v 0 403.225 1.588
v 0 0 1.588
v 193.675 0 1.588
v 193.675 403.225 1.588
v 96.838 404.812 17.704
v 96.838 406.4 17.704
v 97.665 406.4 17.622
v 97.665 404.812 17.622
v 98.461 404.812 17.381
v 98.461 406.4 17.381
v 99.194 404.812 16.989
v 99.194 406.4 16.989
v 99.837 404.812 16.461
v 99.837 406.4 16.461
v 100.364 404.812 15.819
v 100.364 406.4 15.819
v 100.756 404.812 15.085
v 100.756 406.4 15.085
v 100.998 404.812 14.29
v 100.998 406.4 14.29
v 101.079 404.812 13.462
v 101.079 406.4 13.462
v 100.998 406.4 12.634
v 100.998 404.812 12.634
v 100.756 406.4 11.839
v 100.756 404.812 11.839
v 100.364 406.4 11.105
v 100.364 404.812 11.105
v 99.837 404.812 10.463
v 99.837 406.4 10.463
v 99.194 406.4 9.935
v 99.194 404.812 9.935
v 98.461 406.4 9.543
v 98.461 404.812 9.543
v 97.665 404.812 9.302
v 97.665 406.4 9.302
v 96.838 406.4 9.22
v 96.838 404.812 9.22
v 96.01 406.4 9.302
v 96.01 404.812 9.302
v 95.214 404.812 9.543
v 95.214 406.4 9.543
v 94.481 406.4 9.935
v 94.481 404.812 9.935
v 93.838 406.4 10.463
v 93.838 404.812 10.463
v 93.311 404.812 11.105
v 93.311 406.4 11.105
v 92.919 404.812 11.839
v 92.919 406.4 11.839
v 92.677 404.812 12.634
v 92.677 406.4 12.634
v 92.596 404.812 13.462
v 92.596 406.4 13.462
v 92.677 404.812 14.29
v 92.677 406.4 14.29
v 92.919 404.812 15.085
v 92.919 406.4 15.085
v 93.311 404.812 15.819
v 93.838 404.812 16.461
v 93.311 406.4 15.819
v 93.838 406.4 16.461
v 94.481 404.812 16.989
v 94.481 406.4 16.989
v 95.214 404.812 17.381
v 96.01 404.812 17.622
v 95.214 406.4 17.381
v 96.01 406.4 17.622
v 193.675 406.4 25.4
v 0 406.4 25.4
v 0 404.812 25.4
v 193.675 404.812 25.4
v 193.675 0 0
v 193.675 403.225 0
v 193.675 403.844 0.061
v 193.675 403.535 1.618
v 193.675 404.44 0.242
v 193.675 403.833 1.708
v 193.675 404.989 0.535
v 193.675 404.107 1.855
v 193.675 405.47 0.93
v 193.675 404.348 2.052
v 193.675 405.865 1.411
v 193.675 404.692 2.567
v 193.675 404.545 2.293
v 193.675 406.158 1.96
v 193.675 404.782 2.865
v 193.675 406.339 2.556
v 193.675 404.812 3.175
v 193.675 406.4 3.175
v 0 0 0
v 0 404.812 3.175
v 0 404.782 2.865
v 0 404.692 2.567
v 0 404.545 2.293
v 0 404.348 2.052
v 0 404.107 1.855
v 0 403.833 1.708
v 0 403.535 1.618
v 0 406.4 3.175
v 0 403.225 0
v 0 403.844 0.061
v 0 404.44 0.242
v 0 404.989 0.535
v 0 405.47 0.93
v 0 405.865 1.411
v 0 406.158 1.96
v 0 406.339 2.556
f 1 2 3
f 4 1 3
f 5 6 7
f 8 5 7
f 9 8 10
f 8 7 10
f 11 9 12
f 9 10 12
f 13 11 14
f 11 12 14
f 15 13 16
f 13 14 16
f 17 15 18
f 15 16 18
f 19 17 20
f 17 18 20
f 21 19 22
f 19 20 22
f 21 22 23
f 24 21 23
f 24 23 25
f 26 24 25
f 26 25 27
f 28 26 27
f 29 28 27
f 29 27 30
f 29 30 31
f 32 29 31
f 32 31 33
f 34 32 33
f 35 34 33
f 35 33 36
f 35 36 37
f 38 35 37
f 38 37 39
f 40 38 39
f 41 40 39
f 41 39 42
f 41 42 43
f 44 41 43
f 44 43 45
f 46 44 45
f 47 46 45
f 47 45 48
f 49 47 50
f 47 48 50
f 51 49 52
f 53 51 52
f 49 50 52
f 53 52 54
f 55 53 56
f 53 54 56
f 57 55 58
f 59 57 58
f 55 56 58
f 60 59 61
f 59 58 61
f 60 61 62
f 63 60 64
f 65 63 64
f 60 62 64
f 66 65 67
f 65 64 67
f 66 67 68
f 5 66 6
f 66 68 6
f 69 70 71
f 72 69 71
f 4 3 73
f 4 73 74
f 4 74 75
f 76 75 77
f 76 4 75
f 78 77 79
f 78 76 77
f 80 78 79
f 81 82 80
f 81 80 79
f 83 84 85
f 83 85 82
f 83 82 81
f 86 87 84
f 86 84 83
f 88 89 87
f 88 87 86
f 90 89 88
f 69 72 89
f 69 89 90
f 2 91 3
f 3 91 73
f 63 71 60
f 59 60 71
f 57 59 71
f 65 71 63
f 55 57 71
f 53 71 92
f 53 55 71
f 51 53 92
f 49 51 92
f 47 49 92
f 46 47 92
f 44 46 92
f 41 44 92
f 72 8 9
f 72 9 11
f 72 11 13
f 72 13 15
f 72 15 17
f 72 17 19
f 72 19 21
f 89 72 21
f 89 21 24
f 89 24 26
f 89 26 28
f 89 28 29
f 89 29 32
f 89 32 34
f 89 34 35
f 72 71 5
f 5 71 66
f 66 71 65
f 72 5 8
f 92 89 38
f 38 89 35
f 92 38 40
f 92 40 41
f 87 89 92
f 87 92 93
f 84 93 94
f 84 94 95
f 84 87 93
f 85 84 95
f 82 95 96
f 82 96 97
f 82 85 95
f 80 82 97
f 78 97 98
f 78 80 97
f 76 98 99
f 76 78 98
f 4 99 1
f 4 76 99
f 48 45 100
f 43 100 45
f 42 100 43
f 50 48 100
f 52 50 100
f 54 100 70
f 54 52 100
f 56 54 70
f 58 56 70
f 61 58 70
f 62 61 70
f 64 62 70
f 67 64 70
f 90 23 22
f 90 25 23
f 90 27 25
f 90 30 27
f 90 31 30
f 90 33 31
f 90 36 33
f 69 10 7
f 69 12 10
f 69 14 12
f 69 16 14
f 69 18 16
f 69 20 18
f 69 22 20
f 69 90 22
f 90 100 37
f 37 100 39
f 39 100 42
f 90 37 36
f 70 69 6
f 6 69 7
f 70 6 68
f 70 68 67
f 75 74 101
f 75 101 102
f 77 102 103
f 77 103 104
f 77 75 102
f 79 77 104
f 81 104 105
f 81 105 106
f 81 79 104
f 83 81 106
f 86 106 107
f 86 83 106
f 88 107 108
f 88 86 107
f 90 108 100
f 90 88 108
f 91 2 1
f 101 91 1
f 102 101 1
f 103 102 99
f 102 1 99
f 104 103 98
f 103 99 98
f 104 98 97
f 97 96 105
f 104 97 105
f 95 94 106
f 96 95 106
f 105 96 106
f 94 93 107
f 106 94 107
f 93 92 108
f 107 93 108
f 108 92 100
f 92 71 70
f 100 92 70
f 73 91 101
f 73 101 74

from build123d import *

# Parameters (mm, degrees)
SKETCH1_W                    = 193.675
SKETCH1_H                    = 406.4
BOSS_EXTRUDE1_DEPTH          = 1.5875
EDGE_FLANGE1_STRIP_W         = 9.525
EDGE_FLANGE1_STRIP_H         = 1.5875
EDGE_FLANGE1_STRIP_CUT_DEPTH = 193.675
EDGE_FLANGE1_DEPTH           = 193.675
SKETCH5_R                    = 4.2418
CUT_EXTRUDE1_DEPTH           = 2.54


# Sheet-metal steps are written as plain solids
with BuildPart() as part:
    # Sketch1 → Boss-Extrude1 (new body)
    with BuildSketch(Plane.XY):
        with Locations((96.8375, 203.2)):
            Rectangle(SKETCH1_W, SKETCH1_H)
    extrude(amount=BOSS_EXTRUDE1_DEPTH)

    # Edge-Flange1 strip (across the edge) → Edge-Flange1 strip cut (cut)
    with BuildSketch(Plane(origin=(193.675, 406.4, 1.5875), x_dir=(0, -1, 0), z_dir=(-1, 0, 0))):
        with Locations((-1.5875, -0.79375)):
            Rectangle(EDGE_FLANGE1_STRIP_W, EDGE_FLANGE1_STRIP_H)
    extrude(amount=EDGE_FLANGE1_STRIP_CUT_DEPTH, mode=Mode.SUBTRACT)

    # Edge-Flange1 section (across the edge) → Edge-Flange1 (add)
    with BuildSketch(Plane(origin=(193.675, 406.4, 1.5875), x_dir=(0, -1, 0), z_dir=(-1, 0, 0))):
        with BuildLine():
            Line((0, 1.5875), (0, 23.8125))
            Line((0, 23.8125), (1.5875, 23.8125))
            Line((1.5875, 23.8125), (1.5875, 1.5875))
            ThreePointArc((1.5875, 1.5875), (2.052467985, 0.464967985), (3.175, 0))
            Line((3.175, 0), (3.175, -1.5875))
            ThreePointArc((3.175, -1.5875), (0.92993597, -0.65756403), (0, 1.5875))
        make_face()
    extrude(amount=EDGE_FLANGE1_DEPTH)

    # Sketch5 → Cut-Extrude1 (cut)
    with BuildSketch(Plane(origin=(0, 406.4, 0), x_dir=(1, 0, 0), z_dir=(0, 1, 0))):
        with Locations(Location((96.8375, -13.462, 0), (0, 0, 270))):
            Circle(SKETCH5_R)
    extrude(amount=-CUT_EXTRUDE1_DEPTH, mode=Mode.SUBTRACT)


solid = part.part
